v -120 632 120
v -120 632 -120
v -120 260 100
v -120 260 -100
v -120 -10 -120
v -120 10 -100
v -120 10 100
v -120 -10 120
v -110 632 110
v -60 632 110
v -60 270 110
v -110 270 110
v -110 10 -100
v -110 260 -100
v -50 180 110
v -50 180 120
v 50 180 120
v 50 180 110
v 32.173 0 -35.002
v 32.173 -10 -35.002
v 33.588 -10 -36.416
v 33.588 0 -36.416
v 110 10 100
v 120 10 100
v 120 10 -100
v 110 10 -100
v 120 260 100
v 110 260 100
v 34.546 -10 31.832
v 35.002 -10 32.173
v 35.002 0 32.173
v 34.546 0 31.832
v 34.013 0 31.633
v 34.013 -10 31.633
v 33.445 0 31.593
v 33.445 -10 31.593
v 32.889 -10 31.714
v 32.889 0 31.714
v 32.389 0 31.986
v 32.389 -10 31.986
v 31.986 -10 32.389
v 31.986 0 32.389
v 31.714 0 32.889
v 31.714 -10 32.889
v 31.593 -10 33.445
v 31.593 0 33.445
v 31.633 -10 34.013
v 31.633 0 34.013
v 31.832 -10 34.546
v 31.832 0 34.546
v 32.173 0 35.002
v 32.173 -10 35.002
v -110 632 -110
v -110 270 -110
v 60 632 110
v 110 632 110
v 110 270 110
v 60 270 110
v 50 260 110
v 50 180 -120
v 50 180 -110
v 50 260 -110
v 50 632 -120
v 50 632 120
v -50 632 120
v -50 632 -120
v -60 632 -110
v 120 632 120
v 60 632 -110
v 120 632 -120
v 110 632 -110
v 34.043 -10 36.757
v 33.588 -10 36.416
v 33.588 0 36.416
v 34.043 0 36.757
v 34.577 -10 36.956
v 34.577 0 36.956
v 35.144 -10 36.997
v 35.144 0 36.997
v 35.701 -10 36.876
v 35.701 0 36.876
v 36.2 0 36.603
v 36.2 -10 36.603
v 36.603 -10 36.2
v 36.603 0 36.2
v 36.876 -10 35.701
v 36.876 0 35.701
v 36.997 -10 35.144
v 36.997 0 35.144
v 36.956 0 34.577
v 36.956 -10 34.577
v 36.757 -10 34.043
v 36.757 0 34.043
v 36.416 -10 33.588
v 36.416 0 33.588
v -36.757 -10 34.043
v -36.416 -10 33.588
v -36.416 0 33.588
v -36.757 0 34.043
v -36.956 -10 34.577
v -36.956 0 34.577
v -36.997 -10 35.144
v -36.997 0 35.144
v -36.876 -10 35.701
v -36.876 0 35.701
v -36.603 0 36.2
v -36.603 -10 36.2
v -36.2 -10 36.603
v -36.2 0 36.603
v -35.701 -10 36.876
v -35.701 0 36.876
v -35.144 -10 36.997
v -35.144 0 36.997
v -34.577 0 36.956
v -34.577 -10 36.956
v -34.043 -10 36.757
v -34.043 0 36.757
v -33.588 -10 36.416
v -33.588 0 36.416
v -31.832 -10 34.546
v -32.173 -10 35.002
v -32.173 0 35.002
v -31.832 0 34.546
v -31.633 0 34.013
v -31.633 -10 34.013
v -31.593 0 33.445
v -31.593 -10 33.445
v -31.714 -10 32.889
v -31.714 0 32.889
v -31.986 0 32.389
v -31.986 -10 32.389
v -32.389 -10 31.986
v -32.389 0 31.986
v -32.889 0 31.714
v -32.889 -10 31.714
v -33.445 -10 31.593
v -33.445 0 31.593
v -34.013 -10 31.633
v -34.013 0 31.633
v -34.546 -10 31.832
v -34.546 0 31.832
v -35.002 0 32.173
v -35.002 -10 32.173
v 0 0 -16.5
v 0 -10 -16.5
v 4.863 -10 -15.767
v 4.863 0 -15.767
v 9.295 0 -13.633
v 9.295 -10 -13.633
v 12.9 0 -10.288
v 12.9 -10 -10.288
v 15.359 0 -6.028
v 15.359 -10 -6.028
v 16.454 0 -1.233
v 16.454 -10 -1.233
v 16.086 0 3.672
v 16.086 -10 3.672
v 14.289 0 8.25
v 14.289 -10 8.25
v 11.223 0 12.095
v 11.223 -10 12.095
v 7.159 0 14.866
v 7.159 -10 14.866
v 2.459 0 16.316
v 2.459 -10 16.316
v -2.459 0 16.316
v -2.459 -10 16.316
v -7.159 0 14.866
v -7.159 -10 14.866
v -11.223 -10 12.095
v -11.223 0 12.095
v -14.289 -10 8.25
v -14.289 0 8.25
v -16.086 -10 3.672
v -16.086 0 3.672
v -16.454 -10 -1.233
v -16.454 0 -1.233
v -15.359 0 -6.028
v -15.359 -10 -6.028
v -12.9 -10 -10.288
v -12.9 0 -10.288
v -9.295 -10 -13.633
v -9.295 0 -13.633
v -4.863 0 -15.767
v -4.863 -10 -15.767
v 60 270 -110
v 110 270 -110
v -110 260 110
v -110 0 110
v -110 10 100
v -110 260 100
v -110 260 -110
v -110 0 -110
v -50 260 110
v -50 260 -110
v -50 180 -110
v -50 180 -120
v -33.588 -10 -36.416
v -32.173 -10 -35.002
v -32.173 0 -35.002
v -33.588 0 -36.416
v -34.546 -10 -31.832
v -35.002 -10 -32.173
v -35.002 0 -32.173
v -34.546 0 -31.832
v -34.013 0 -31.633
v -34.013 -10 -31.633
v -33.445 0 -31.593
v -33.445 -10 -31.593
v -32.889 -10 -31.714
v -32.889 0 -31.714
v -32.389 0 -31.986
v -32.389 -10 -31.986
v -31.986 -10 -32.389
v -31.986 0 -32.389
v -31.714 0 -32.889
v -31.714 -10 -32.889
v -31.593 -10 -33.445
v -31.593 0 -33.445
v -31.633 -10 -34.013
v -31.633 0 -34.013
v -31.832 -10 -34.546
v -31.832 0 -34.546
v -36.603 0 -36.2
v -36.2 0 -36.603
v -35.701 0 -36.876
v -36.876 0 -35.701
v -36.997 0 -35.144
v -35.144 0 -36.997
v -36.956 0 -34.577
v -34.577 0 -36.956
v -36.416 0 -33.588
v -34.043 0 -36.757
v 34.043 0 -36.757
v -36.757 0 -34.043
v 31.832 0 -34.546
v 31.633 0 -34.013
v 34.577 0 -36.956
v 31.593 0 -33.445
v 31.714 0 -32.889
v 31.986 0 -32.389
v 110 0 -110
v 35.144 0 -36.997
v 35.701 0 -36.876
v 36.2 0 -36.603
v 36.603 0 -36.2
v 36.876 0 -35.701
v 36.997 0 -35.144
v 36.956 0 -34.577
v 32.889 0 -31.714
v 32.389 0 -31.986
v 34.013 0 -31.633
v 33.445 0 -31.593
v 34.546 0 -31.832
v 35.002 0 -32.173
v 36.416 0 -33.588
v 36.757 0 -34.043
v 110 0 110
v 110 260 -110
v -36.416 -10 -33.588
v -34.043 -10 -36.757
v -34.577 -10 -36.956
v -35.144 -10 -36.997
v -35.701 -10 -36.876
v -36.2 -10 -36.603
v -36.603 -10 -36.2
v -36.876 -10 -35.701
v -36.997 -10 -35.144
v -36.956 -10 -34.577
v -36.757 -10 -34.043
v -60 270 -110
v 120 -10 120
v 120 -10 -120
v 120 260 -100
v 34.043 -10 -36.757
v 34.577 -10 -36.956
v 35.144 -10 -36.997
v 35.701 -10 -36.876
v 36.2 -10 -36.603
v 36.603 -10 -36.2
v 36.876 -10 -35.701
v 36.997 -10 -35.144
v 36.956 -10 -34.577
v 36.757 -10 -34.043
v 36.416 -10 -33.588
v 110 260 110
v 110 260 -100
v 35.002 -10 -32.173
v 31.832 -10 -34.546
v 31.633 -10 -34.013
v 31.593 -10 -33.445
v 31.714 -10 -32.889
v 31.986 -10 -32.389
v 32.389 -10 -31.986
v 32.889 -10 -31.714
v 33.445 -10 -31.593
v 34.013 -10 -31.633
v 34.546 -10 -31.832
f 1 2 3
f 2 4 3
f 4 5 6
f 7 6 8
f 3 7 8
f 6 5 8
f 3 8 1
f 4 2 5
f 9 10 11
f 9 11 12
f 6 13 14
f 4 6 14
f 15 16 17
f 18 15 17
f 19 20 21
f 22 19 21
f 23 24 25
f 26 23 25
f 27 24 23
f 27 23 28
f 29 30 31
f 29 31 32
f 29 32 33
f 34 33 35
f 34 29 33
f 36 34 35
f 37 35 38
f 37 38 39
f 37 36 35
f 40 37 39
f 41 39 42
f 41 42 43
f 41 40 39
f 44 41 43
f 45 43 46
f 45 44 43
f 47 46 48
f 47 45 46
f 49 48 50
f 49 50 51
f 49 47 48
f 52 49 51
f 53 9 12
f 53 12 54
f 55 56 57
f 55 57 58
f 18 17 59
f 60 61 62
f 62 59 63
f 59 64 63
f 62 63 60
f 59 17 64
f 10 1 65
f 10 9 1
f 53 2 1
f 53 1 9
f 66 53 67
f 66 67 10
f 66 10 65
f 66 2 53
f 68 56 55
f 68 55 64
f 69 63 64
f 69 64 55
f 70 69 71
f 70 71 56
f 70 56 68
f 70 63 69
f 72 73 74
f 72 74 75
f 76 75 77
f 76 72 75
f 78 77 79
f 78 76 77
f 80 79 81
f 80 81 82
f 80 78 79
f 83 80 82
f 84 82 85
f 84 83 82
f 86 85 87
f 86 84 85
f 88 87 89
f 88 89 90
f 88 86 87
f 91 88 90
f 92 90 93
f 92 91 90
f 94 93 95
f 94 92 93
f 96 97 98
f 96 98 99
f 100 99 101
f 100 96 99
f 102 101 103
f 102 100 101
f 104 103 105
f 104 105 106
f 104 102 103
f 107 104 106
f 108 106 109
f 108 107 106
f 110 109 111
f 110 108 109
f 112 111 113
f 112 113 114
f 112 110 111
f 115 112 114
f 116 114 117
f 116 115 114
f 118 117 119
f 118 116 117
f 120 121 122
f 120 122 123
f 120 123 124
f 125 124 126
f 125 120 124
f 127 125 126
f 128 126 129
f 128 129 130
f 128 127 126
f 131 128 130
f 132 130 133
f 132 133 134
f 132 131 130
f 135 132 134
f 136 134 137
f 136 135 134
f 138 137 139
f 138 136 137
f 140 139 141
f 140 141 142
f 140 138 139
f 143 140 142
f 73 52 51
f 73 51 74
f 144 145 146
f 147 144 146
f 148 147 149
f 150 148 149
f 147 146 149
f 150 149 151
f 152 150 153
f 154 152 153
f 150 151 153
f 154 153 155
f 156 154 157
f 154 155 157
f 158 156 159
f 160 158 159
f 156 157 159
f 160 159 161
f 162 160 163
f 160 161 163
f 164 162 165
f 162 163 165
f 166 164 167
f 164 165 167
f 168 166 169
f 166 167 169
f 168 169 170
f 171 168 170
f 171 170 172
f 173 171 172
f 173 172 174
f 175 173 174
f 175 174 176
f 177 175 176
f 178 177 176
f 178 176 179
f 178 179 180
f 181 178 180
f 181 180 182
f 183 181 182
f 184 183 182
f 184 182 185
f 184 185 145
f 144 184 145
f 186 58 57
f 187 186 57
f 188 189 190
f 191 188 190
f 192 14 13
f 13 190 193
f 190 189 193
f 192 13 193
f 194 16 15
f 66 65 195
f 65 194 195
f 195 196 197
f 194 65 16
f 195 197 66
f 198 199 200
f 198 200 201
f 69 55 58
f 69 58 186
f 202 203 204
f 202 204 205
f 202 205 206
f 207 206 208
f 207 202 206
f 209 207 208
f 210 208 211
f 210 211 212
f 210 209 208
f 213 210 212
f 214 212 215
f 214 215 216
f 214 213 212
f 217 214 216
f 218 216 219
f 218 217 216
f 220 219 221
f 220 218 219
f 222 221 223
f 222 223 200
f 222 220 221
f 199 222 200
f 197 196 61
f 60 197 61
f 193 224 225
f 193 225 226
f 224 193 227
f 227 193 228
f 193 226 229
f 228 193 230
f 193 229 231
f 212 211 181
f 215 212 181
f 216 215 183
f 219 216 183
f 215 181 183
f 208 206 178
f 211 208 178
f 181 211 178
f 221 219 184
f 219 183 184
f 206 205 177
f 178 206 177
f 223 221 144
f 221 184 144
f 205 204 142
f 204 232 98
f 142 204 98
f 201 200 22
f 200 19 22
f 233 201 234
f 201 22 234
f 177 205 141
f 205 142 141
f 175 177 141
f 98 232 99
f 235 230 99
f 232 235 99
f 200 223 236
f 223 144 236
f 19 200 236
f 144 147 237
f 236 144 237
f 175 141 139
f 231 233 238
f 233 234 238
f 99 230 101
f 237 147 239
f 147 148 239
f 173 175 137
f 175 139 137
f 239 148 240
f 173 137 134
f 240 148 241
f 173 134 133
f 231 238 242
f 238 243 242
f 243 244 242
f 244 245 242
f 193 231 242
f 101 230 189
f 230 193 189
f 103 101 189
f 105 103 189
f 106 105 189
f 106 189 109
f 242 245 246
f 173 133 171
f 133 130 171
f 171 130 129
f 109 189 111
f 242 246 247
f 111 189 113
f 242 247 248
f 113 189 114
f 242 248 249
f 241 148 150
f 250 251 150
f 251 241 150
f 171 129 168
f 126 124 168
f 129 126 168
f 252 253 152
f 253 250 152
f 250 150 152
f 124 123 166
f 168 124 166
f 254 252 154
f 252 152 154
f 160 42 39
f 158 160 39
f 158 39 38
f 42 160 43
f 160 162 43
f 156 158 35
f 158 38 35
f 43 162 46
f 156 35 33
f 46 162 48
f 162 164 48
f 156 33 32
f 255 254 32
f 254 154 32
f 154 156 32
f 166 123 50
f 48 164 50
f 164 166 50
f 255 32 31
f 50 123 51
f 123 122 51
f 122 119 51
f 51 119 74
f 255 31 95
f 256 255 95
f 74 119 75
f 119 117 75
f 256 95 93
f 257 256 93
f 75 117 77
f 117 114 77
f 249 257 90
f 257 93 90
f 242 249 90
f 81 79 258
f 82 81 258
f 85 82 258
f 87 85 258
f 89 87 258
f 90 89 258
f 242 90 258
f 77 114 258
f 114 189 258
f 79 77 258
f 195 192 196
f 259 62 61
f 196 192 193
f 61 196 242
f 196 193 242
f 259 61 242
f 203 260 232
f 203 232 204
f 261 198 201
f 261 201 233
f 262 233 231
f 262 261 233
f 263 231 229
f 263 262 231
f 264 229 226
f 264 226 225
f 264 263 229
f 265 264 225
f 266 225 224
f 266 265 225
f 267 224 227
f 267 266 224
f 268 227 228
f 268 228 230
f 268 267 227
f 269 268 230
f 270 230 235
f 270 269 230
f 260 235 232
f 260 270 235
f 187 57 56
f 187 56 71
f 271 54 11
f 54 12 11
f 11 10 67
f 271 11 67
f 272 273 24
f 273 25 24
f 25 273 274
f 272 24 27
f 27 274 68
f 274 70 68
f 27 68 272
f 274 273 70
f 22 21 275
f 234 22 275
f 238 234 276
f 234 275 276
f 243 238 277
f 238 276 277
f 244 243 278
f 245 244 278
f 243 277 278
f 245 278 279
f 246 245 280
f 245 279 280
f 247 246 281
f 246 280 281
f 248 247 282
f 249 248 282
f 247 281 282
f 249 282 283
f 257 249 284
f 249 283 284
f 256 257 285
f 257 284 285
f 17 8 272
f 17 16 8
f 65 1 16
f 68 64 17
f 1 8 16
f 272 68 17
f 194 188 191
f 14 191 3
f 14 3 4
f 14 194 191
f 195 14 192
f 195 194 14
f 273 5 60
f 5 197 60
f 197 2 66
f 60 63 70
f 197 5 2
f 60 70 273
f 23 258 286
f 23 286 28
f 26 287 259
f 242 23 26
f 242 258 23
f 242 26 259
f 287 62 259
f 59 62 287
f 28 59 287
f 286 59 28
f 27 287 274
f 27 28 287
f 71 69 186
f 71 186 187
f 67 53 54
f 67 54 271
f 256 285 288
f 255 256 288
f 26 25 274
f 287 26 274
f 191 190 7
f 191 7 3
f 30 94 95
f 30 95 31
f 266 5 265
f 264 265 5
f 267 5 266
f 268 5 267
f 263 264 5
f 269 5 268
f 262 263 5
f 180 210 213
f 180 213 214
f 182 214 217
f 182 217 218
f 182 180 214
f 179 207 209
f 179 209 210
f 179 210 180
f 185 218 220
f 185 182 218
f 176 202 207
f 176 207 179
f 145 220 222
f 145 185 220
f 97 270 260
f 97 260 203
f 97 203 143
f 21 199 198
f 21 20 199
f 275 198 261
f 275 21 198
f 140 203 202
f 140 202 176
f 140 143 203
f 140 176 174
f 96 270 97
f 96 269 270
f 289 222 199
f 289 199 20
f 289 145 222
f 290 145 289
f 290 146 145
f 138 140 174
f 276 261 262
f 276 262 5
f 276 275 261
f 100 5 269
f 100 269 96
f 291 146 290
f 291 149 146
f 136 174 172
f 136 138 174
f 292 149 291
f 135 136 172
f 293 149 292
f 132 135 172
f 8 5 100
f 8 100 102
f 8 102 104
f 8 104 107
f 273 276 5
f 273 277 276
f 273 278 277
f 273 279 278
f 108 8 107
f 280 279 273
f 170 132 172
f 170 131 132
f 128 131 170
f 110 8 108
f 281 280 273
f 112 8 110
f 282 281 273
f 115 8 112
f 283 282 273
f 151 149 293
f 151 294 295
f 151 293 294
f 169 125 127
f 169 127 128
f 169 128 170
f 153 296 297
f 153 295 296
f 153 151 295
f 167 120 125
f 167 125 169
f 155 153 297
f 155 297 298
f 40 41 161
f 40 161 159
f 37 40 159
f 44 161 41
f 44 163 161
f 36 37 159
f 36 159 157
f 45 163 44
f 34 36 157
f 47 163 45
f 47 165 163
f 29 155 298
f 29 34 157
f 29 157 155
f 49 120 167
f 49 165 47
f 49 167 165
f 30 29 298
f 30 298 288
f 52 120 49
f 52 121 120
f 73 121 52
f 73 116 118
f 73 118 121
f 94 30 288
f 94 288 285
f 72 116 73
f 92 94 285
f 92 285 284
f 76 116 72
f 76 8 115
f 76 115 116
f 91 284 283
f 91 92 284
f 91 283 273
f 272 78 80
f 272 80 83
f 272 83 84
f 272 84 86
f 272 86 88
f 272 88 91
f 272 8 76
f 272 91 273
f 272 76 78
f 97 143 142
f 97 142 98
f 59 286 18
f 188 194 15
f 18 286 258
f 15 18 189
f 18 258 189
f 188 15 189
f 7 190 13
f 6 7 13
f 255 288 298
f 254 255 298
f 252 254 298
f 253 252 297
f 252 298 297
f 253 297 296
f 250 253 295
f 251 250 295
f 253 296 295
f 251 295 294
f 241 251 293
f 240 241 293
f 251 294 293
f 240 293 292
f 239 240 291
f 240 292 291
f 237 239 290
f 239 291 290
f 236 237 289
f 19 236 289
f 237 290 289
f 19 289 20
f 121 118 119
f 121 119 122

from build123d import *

# Parameters (mm, degrees)
SKETCH1_W           = 240
SKETCH1_H           = 240
SKETCH1_W_2         = 220
SKETCH1_H_2         = 220
BOSS_EXTRUDE1_DEPTH = 260
SKETCH2_W           = 240
SKETCH2_H           = 240
BOSS_EXTRUDE2_DEPTH = 10
SKETCH3_R           = 16.5
CUT_EXTRUDE1_DEPTH  = 20
CUT_EXTRUDE3_DEPTH  = 10
SKETCH8_W           = 100
SKETCH8_H           = 108.812952024
CUT_EXTRUDE4_DEPTH  = 296
BOSS_EXTRUDE4_DEPTH = 372
SKETCH10_W          = 200
SKETCH10_H          = 250
CUT_EXTRUDE5_DEPTH  = 372
SKETCH11_W          = 10
SKETCH11_H          = 220
BOSS_EXTRUDE6_DEPTH = 362
SKETCH12_W          = 70
SKETCH12_H          = 240
BOSS_EXTRUDE7_DEPTH = 10


with BuildPart() as part:
    # Sketch1 → Boss-Extrude1 (new body)
    with BuildSketch(Plane(origin=(0, 0, 0), x_dir=(1, 0, 0), z_dir=(0, 1, 0))):
        Rectangle(SKETCH1_W, SKETCH1_H)
        Rectangle(SKETCH1_W_2, SKETCH1_H_2, mode=Mode.SUBTRACT)
    extrude(amount=BOSS_EXTRUDE1_DEPTH)

    # Sketch2 → Boss-Extrude2 (add)
    with BuildSketch(Plane.XZ):
        Rectangle(SKETCH2_W, SKETCH2_H)
    extrude(amount=BOSS_EXTRUDE2_DEPTH)

    # Sketch3 → Cut-Extrude1 (cut)
    with BuildSketch(Plane.XZ.offset(10)):
        with Locations(Location((0, 0, 0), (0, 0, 270))):
            Circle(SKETCH3_R)
    extrude(amount=-CUT_EXTRUDE1_DEPTH, mode=Mode.SUBTRACT)

    # Sketch7 → Cut-Extrude3 (cut)
    with BuildSketch(Plane(origin=(0, -10, 0), x_dir=(-1, 0, 0), z_dir=(0, -1, 0))):
        with BuildLine():
            Line((-36.415999231, 33.587572106), (-35.001785669, 32.173358544))
            ThreePointArc((-35.001785669, 32.173358544), (-32.173358544, 32.173358544), (-32.173358544, 35.001785669))
            Line((-32.173358544, 35.001785669), (-33.587572106, 36.415999231))
            ThreePointArc((-33.587572106, 36.415999231), (-36.415999231, 36.415999231), (-36.415999231, 33.587572106))
        make_face()
        with BuildLine():
            Line((32.173358544, 35.001785669), (33.587572106, 36.415999231))
            ThreePointArc((33.587572106, 36.415999231), (36.415999231, 36.415999231), (36.415999231, 33.587572106))
            Line((36.415999231, 33.587572106), (35.001785669, 32.173358544))
            ThreePointArc((35.001785669, 32.173358544), (32.173358544, 32.173358544), (32.173358544, 35.001785669))
        make_face()
        with BuildLine():
            Line((35.001785669, -32.173358544), (36.415999231, -33.587572106))
            ThreePointArc((36.415999231, -33.587572106), (36.415999231, -36.415999231), (33.587572106, -36.415999231))
            Line((33.587572106, -36.415999231), (32.173358544, -35.001785669))
            ThreePointArc((32.173358544, -35.001785669), (32.173358544, -32.173358544), (35.001785669, -32.173358544))
        make_face()
        with BuildLine():
            Line((-36.415999231, -33.587572106), (-35.001785669, -32.173358544))
            ThreePointArc((-35.001785669, -32.173358544), (-32.173358544, -32.173358544), (-32.173358544, -35.001785669))
            Line((-32.173358544, -35.001785669), (-33.587572106, -36.415999231))
            ThreePointArc((-33.587572106, -36.415999231), (-36.415999231, -36.415999231), (-36.415999231, -33.587572106))
        make_face()
    extrude(amount=-CUT_EXTRUDE3_DEPTH, mode=Mode.SUBTRACT)

    # Sketch8 → Cut-Extrude4 (cut)
    with BuildSketch(Plane.XY.offset(120)):
        with Locations((0, 234.406476012)):
            Rectangle(SKETCH8_W, SKETCH8_H)
    extrude(amount=-CUT_EXTRUDE4_DEPTH, mode=Mode.SUBTRACT)

    # Sketch9 → Boss-Extrude4 (add)
    with BuildSketch(Plane(origin=(0, 260, 0), x_dir=(1, 0, 0), z_dir=(0, 1, 0))):
        Polygon((-50, 110), (-50, 120), (-120, 120), (-120, -120), (-50, -120), (-50, -110), (-110, -110), (-110, 110), align=None)
        Polygon((50, 110), (50, 120), (120, 120), (120, -120), (50, -120), (50, -110), (110, -110), (110, 110), align=None)
    extrude(amount=BOSS_EXTRUDE4_DEPTH)

    # Sketch10 → Cut-Extrude5 (cut)
    with BuildSketch(Plane(origin=(120, 0, 0), x_dir=(0, 0, -1), z_dir=(1, 0, 0))):
        with Locations((0, 135)):
            Rectangle(SKETCH10_W, SKETCH10_H)
    extrude(amount=-CUT_EXTRUDE5_DEPTH, mode=Mode.SUBTRACT)

    # Sketch11 → Boss-Extrude6 (add)
    with BuildSketch(Plane(origin=(0, 632, 0), x_dir=(1, 0, 0), z_dir=(0, 1, 0))):
        with Locations((55, 0)):
            Rectangle(SKETCH11_W, SKETCH11_H)
        with Locations((-55, 0)):
            Rectangle(SKETCH11_W, SKETCH11_H)
    extrude(amount=-BOSS_EXTRUDE6_DEPTH)

    # Sketch12 → Boss-Extrude7 (add)
    with BuildSketch(Plane.XZ.offset(-270)):
        with Locations((-85, 0)):
            Rectangle(SKETCH12_W, SKETCH12_H)
        with Locations((85, 0)):
            Rectangle(SKETCH12_W, SKETCH12_H)
    extrude(amount=BOSS_EXTRUDE7_DEPTH)


solid = part.part
